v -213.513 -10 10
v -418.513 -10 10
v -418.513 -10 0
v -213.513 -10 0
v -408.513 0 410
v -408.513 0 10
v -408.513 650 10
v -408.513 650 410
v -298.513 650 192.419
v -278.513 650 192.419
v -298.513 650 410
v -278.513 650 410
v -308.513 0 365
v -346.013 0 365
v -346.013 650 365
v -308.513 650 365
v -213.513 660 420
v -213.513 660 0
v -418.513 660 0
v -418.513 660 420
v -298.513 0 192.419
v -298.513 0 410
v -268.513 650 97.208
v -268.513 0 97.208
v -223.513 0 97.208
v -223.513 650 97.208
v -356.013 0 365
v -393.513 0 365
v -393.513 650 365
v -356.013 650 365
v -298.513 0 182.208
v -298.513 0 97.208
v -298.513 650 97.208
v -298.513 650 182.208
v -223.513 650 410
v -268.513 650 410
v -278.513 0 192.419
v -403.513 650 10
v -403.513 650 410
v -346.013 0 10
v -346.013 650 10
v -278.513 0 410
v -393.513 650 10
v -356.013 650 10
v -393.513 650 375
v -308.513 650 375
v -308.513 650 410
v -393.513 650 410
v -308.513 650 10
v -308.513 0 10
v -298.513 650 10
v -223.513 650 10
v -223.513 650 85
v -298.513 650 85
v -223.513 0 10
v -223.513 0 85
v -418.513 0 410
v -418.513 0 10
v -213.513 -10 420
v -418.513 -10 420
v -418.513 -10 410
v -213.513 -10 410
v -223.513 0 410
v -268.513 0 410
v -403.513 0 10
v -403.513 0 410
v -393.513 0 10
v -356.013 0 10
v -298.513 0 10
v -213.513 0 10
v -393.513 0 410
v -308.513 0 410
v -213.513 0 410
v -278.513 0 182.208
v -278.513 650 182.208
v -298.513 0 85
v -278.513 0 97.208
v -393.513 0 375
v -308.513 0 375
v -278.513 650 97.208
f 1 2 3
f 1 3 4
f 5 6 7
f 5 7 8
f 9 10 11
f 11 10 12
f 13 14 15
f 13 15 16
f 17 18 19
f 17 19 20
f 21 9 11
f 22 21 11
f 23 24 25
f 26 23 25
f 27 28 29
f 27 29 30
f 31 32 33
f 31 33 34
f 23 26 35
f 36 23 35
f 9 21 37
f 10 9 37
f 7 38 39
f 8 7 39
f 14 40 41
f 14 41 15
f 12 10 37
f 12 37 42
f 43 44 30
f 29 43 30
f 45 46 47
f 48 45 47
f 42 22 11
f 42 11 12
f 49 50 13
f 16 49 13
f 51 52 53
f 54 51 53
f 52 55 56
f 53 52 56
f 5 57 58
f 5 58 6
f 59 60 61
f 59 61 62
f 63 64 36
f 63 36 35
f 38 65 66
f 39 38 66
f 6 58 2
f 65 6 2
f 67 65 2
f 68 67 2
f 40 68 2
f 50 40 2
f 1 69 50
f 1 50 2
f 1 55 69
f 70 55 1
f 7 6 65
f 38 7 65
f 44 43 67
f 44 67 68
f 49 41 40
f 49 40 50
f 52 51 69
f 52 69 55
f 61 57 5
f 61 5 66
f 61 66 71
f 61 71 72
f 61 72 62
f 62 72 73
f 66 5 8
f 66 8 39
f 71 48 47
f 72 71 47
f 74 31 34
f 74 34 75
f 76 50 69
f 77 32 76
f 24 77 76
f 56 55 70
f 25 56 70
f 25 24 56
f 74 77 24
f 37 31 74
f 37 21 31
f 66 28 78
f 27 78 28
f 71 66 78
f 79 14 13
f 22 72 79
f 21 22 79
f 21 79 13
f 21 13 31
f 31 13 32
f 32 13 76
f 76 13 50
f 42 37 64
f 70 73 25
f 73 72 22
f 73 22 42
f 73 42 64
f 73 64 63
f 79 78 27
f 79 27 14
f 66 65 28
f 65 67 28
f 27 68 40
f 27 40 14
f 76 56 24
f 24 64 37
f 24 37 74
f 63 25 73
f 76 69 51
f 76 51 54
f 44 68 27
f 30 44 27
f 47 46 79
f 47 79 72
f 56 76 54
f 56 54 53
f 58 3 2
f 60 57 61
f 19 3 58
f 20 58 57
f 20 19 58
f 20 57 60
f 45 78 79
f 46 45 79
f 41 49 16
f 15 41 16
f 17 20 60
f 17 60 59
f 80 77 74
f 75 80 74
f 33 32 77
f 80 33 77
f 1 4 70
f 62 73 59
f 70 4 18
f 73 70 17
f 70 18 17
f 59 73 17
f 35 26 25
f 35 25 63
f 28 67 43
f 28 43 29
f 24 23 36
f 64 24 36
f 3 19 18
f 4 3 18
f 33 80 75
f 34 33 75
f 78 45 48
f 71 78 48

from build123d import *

# Parameters (mm, degrees)
F0_W     = 205
F0_H     = 420
F0_W_2   = 37.5
F0_H_2   = 355
F0_W_3   = 75
F0_H_3   = 75
F0_W_4   = 20
F0_H_4   = 85
F0_W_5   = 5
F0_H_5   = 400
F0_W_6   = 85
F0_H_6   = 35
F0_H_7   = 217.581037
F0_W_7   = 45
F0_H_8   = 312.792163
F1_DEPTH = 650
F2_W     = 10
F2_H     = 420
F3_DEPTH = 205
F4_W     = 205
F4_H     = 10
F5_DEPTH = 10


with BuildPart() as f1:
    # F0 (on Front) → F1 (new body)
    with BuildSketch(Plane.XZ):
        with Locations((-316.01329, 210)):
            Rectangle(F0_W, F0_H)
        with Locations((-374.76329, 187.5)):
            Rectangle(F0_W_2, F0_H_2, mode=Mode.SUBTRACT)
        with Locations((-327.26329, 187.5)):
            Rectangle(F0_W_2, F0_H_2, mode=Mode.SUBTRACT)
        with Locations((-261.01329, 47.5)):
            Rectangle(F0_W_3, F0_H_3, mode=Mode.SUBTRACT)
        with Locations((-288.51329, 139.707837)):
            Rectangle(F0_W_4, F0_H_4, mode=Mode.SUBTRACT)
        with Locations((-406.01329, 210)):
            Rectangle(F0_W_5, F0_H_5, mode=Mode.SUBTRACT)
        with Locations((-351.01329, 392.5)):
            Rectangle(F0_W_6, F0_H_6, mode=Mode.SUBTRACT)
        with Locations((-288.51329, 301.209481)):
            Rectangle(F0_W_4, F0_H_7, mode=Mode.SUBTRACT)
        with Locations((-246.01329, 253.603918)):
            Rectangle(F0_W_7, F0_H_8, mode=Mode.SUBTRACT)
    extrude(amount=-F1_DEPTH)

    # F2 (on face) → F3 (join, through all)
    with BuildSketch(Plane.YZ.offset(-213.51329)):
        with Locations((655, 210)):
            Rectangle(F2_W, F2_H)
    extrude(amount=-F3_DEPTH)

    # F4 (on face) → F5 (join)
    with BuildSketch(Plane.XZ):
        with Locations((-316.01329, 415)):
            Rectangle(F4_W, F4_H)
        with Locations((-316.01329, 5)):
            Rectangle(F4_W, F4_H)
    extrude(amount=F5_DEPTH)


solid = f1.part
